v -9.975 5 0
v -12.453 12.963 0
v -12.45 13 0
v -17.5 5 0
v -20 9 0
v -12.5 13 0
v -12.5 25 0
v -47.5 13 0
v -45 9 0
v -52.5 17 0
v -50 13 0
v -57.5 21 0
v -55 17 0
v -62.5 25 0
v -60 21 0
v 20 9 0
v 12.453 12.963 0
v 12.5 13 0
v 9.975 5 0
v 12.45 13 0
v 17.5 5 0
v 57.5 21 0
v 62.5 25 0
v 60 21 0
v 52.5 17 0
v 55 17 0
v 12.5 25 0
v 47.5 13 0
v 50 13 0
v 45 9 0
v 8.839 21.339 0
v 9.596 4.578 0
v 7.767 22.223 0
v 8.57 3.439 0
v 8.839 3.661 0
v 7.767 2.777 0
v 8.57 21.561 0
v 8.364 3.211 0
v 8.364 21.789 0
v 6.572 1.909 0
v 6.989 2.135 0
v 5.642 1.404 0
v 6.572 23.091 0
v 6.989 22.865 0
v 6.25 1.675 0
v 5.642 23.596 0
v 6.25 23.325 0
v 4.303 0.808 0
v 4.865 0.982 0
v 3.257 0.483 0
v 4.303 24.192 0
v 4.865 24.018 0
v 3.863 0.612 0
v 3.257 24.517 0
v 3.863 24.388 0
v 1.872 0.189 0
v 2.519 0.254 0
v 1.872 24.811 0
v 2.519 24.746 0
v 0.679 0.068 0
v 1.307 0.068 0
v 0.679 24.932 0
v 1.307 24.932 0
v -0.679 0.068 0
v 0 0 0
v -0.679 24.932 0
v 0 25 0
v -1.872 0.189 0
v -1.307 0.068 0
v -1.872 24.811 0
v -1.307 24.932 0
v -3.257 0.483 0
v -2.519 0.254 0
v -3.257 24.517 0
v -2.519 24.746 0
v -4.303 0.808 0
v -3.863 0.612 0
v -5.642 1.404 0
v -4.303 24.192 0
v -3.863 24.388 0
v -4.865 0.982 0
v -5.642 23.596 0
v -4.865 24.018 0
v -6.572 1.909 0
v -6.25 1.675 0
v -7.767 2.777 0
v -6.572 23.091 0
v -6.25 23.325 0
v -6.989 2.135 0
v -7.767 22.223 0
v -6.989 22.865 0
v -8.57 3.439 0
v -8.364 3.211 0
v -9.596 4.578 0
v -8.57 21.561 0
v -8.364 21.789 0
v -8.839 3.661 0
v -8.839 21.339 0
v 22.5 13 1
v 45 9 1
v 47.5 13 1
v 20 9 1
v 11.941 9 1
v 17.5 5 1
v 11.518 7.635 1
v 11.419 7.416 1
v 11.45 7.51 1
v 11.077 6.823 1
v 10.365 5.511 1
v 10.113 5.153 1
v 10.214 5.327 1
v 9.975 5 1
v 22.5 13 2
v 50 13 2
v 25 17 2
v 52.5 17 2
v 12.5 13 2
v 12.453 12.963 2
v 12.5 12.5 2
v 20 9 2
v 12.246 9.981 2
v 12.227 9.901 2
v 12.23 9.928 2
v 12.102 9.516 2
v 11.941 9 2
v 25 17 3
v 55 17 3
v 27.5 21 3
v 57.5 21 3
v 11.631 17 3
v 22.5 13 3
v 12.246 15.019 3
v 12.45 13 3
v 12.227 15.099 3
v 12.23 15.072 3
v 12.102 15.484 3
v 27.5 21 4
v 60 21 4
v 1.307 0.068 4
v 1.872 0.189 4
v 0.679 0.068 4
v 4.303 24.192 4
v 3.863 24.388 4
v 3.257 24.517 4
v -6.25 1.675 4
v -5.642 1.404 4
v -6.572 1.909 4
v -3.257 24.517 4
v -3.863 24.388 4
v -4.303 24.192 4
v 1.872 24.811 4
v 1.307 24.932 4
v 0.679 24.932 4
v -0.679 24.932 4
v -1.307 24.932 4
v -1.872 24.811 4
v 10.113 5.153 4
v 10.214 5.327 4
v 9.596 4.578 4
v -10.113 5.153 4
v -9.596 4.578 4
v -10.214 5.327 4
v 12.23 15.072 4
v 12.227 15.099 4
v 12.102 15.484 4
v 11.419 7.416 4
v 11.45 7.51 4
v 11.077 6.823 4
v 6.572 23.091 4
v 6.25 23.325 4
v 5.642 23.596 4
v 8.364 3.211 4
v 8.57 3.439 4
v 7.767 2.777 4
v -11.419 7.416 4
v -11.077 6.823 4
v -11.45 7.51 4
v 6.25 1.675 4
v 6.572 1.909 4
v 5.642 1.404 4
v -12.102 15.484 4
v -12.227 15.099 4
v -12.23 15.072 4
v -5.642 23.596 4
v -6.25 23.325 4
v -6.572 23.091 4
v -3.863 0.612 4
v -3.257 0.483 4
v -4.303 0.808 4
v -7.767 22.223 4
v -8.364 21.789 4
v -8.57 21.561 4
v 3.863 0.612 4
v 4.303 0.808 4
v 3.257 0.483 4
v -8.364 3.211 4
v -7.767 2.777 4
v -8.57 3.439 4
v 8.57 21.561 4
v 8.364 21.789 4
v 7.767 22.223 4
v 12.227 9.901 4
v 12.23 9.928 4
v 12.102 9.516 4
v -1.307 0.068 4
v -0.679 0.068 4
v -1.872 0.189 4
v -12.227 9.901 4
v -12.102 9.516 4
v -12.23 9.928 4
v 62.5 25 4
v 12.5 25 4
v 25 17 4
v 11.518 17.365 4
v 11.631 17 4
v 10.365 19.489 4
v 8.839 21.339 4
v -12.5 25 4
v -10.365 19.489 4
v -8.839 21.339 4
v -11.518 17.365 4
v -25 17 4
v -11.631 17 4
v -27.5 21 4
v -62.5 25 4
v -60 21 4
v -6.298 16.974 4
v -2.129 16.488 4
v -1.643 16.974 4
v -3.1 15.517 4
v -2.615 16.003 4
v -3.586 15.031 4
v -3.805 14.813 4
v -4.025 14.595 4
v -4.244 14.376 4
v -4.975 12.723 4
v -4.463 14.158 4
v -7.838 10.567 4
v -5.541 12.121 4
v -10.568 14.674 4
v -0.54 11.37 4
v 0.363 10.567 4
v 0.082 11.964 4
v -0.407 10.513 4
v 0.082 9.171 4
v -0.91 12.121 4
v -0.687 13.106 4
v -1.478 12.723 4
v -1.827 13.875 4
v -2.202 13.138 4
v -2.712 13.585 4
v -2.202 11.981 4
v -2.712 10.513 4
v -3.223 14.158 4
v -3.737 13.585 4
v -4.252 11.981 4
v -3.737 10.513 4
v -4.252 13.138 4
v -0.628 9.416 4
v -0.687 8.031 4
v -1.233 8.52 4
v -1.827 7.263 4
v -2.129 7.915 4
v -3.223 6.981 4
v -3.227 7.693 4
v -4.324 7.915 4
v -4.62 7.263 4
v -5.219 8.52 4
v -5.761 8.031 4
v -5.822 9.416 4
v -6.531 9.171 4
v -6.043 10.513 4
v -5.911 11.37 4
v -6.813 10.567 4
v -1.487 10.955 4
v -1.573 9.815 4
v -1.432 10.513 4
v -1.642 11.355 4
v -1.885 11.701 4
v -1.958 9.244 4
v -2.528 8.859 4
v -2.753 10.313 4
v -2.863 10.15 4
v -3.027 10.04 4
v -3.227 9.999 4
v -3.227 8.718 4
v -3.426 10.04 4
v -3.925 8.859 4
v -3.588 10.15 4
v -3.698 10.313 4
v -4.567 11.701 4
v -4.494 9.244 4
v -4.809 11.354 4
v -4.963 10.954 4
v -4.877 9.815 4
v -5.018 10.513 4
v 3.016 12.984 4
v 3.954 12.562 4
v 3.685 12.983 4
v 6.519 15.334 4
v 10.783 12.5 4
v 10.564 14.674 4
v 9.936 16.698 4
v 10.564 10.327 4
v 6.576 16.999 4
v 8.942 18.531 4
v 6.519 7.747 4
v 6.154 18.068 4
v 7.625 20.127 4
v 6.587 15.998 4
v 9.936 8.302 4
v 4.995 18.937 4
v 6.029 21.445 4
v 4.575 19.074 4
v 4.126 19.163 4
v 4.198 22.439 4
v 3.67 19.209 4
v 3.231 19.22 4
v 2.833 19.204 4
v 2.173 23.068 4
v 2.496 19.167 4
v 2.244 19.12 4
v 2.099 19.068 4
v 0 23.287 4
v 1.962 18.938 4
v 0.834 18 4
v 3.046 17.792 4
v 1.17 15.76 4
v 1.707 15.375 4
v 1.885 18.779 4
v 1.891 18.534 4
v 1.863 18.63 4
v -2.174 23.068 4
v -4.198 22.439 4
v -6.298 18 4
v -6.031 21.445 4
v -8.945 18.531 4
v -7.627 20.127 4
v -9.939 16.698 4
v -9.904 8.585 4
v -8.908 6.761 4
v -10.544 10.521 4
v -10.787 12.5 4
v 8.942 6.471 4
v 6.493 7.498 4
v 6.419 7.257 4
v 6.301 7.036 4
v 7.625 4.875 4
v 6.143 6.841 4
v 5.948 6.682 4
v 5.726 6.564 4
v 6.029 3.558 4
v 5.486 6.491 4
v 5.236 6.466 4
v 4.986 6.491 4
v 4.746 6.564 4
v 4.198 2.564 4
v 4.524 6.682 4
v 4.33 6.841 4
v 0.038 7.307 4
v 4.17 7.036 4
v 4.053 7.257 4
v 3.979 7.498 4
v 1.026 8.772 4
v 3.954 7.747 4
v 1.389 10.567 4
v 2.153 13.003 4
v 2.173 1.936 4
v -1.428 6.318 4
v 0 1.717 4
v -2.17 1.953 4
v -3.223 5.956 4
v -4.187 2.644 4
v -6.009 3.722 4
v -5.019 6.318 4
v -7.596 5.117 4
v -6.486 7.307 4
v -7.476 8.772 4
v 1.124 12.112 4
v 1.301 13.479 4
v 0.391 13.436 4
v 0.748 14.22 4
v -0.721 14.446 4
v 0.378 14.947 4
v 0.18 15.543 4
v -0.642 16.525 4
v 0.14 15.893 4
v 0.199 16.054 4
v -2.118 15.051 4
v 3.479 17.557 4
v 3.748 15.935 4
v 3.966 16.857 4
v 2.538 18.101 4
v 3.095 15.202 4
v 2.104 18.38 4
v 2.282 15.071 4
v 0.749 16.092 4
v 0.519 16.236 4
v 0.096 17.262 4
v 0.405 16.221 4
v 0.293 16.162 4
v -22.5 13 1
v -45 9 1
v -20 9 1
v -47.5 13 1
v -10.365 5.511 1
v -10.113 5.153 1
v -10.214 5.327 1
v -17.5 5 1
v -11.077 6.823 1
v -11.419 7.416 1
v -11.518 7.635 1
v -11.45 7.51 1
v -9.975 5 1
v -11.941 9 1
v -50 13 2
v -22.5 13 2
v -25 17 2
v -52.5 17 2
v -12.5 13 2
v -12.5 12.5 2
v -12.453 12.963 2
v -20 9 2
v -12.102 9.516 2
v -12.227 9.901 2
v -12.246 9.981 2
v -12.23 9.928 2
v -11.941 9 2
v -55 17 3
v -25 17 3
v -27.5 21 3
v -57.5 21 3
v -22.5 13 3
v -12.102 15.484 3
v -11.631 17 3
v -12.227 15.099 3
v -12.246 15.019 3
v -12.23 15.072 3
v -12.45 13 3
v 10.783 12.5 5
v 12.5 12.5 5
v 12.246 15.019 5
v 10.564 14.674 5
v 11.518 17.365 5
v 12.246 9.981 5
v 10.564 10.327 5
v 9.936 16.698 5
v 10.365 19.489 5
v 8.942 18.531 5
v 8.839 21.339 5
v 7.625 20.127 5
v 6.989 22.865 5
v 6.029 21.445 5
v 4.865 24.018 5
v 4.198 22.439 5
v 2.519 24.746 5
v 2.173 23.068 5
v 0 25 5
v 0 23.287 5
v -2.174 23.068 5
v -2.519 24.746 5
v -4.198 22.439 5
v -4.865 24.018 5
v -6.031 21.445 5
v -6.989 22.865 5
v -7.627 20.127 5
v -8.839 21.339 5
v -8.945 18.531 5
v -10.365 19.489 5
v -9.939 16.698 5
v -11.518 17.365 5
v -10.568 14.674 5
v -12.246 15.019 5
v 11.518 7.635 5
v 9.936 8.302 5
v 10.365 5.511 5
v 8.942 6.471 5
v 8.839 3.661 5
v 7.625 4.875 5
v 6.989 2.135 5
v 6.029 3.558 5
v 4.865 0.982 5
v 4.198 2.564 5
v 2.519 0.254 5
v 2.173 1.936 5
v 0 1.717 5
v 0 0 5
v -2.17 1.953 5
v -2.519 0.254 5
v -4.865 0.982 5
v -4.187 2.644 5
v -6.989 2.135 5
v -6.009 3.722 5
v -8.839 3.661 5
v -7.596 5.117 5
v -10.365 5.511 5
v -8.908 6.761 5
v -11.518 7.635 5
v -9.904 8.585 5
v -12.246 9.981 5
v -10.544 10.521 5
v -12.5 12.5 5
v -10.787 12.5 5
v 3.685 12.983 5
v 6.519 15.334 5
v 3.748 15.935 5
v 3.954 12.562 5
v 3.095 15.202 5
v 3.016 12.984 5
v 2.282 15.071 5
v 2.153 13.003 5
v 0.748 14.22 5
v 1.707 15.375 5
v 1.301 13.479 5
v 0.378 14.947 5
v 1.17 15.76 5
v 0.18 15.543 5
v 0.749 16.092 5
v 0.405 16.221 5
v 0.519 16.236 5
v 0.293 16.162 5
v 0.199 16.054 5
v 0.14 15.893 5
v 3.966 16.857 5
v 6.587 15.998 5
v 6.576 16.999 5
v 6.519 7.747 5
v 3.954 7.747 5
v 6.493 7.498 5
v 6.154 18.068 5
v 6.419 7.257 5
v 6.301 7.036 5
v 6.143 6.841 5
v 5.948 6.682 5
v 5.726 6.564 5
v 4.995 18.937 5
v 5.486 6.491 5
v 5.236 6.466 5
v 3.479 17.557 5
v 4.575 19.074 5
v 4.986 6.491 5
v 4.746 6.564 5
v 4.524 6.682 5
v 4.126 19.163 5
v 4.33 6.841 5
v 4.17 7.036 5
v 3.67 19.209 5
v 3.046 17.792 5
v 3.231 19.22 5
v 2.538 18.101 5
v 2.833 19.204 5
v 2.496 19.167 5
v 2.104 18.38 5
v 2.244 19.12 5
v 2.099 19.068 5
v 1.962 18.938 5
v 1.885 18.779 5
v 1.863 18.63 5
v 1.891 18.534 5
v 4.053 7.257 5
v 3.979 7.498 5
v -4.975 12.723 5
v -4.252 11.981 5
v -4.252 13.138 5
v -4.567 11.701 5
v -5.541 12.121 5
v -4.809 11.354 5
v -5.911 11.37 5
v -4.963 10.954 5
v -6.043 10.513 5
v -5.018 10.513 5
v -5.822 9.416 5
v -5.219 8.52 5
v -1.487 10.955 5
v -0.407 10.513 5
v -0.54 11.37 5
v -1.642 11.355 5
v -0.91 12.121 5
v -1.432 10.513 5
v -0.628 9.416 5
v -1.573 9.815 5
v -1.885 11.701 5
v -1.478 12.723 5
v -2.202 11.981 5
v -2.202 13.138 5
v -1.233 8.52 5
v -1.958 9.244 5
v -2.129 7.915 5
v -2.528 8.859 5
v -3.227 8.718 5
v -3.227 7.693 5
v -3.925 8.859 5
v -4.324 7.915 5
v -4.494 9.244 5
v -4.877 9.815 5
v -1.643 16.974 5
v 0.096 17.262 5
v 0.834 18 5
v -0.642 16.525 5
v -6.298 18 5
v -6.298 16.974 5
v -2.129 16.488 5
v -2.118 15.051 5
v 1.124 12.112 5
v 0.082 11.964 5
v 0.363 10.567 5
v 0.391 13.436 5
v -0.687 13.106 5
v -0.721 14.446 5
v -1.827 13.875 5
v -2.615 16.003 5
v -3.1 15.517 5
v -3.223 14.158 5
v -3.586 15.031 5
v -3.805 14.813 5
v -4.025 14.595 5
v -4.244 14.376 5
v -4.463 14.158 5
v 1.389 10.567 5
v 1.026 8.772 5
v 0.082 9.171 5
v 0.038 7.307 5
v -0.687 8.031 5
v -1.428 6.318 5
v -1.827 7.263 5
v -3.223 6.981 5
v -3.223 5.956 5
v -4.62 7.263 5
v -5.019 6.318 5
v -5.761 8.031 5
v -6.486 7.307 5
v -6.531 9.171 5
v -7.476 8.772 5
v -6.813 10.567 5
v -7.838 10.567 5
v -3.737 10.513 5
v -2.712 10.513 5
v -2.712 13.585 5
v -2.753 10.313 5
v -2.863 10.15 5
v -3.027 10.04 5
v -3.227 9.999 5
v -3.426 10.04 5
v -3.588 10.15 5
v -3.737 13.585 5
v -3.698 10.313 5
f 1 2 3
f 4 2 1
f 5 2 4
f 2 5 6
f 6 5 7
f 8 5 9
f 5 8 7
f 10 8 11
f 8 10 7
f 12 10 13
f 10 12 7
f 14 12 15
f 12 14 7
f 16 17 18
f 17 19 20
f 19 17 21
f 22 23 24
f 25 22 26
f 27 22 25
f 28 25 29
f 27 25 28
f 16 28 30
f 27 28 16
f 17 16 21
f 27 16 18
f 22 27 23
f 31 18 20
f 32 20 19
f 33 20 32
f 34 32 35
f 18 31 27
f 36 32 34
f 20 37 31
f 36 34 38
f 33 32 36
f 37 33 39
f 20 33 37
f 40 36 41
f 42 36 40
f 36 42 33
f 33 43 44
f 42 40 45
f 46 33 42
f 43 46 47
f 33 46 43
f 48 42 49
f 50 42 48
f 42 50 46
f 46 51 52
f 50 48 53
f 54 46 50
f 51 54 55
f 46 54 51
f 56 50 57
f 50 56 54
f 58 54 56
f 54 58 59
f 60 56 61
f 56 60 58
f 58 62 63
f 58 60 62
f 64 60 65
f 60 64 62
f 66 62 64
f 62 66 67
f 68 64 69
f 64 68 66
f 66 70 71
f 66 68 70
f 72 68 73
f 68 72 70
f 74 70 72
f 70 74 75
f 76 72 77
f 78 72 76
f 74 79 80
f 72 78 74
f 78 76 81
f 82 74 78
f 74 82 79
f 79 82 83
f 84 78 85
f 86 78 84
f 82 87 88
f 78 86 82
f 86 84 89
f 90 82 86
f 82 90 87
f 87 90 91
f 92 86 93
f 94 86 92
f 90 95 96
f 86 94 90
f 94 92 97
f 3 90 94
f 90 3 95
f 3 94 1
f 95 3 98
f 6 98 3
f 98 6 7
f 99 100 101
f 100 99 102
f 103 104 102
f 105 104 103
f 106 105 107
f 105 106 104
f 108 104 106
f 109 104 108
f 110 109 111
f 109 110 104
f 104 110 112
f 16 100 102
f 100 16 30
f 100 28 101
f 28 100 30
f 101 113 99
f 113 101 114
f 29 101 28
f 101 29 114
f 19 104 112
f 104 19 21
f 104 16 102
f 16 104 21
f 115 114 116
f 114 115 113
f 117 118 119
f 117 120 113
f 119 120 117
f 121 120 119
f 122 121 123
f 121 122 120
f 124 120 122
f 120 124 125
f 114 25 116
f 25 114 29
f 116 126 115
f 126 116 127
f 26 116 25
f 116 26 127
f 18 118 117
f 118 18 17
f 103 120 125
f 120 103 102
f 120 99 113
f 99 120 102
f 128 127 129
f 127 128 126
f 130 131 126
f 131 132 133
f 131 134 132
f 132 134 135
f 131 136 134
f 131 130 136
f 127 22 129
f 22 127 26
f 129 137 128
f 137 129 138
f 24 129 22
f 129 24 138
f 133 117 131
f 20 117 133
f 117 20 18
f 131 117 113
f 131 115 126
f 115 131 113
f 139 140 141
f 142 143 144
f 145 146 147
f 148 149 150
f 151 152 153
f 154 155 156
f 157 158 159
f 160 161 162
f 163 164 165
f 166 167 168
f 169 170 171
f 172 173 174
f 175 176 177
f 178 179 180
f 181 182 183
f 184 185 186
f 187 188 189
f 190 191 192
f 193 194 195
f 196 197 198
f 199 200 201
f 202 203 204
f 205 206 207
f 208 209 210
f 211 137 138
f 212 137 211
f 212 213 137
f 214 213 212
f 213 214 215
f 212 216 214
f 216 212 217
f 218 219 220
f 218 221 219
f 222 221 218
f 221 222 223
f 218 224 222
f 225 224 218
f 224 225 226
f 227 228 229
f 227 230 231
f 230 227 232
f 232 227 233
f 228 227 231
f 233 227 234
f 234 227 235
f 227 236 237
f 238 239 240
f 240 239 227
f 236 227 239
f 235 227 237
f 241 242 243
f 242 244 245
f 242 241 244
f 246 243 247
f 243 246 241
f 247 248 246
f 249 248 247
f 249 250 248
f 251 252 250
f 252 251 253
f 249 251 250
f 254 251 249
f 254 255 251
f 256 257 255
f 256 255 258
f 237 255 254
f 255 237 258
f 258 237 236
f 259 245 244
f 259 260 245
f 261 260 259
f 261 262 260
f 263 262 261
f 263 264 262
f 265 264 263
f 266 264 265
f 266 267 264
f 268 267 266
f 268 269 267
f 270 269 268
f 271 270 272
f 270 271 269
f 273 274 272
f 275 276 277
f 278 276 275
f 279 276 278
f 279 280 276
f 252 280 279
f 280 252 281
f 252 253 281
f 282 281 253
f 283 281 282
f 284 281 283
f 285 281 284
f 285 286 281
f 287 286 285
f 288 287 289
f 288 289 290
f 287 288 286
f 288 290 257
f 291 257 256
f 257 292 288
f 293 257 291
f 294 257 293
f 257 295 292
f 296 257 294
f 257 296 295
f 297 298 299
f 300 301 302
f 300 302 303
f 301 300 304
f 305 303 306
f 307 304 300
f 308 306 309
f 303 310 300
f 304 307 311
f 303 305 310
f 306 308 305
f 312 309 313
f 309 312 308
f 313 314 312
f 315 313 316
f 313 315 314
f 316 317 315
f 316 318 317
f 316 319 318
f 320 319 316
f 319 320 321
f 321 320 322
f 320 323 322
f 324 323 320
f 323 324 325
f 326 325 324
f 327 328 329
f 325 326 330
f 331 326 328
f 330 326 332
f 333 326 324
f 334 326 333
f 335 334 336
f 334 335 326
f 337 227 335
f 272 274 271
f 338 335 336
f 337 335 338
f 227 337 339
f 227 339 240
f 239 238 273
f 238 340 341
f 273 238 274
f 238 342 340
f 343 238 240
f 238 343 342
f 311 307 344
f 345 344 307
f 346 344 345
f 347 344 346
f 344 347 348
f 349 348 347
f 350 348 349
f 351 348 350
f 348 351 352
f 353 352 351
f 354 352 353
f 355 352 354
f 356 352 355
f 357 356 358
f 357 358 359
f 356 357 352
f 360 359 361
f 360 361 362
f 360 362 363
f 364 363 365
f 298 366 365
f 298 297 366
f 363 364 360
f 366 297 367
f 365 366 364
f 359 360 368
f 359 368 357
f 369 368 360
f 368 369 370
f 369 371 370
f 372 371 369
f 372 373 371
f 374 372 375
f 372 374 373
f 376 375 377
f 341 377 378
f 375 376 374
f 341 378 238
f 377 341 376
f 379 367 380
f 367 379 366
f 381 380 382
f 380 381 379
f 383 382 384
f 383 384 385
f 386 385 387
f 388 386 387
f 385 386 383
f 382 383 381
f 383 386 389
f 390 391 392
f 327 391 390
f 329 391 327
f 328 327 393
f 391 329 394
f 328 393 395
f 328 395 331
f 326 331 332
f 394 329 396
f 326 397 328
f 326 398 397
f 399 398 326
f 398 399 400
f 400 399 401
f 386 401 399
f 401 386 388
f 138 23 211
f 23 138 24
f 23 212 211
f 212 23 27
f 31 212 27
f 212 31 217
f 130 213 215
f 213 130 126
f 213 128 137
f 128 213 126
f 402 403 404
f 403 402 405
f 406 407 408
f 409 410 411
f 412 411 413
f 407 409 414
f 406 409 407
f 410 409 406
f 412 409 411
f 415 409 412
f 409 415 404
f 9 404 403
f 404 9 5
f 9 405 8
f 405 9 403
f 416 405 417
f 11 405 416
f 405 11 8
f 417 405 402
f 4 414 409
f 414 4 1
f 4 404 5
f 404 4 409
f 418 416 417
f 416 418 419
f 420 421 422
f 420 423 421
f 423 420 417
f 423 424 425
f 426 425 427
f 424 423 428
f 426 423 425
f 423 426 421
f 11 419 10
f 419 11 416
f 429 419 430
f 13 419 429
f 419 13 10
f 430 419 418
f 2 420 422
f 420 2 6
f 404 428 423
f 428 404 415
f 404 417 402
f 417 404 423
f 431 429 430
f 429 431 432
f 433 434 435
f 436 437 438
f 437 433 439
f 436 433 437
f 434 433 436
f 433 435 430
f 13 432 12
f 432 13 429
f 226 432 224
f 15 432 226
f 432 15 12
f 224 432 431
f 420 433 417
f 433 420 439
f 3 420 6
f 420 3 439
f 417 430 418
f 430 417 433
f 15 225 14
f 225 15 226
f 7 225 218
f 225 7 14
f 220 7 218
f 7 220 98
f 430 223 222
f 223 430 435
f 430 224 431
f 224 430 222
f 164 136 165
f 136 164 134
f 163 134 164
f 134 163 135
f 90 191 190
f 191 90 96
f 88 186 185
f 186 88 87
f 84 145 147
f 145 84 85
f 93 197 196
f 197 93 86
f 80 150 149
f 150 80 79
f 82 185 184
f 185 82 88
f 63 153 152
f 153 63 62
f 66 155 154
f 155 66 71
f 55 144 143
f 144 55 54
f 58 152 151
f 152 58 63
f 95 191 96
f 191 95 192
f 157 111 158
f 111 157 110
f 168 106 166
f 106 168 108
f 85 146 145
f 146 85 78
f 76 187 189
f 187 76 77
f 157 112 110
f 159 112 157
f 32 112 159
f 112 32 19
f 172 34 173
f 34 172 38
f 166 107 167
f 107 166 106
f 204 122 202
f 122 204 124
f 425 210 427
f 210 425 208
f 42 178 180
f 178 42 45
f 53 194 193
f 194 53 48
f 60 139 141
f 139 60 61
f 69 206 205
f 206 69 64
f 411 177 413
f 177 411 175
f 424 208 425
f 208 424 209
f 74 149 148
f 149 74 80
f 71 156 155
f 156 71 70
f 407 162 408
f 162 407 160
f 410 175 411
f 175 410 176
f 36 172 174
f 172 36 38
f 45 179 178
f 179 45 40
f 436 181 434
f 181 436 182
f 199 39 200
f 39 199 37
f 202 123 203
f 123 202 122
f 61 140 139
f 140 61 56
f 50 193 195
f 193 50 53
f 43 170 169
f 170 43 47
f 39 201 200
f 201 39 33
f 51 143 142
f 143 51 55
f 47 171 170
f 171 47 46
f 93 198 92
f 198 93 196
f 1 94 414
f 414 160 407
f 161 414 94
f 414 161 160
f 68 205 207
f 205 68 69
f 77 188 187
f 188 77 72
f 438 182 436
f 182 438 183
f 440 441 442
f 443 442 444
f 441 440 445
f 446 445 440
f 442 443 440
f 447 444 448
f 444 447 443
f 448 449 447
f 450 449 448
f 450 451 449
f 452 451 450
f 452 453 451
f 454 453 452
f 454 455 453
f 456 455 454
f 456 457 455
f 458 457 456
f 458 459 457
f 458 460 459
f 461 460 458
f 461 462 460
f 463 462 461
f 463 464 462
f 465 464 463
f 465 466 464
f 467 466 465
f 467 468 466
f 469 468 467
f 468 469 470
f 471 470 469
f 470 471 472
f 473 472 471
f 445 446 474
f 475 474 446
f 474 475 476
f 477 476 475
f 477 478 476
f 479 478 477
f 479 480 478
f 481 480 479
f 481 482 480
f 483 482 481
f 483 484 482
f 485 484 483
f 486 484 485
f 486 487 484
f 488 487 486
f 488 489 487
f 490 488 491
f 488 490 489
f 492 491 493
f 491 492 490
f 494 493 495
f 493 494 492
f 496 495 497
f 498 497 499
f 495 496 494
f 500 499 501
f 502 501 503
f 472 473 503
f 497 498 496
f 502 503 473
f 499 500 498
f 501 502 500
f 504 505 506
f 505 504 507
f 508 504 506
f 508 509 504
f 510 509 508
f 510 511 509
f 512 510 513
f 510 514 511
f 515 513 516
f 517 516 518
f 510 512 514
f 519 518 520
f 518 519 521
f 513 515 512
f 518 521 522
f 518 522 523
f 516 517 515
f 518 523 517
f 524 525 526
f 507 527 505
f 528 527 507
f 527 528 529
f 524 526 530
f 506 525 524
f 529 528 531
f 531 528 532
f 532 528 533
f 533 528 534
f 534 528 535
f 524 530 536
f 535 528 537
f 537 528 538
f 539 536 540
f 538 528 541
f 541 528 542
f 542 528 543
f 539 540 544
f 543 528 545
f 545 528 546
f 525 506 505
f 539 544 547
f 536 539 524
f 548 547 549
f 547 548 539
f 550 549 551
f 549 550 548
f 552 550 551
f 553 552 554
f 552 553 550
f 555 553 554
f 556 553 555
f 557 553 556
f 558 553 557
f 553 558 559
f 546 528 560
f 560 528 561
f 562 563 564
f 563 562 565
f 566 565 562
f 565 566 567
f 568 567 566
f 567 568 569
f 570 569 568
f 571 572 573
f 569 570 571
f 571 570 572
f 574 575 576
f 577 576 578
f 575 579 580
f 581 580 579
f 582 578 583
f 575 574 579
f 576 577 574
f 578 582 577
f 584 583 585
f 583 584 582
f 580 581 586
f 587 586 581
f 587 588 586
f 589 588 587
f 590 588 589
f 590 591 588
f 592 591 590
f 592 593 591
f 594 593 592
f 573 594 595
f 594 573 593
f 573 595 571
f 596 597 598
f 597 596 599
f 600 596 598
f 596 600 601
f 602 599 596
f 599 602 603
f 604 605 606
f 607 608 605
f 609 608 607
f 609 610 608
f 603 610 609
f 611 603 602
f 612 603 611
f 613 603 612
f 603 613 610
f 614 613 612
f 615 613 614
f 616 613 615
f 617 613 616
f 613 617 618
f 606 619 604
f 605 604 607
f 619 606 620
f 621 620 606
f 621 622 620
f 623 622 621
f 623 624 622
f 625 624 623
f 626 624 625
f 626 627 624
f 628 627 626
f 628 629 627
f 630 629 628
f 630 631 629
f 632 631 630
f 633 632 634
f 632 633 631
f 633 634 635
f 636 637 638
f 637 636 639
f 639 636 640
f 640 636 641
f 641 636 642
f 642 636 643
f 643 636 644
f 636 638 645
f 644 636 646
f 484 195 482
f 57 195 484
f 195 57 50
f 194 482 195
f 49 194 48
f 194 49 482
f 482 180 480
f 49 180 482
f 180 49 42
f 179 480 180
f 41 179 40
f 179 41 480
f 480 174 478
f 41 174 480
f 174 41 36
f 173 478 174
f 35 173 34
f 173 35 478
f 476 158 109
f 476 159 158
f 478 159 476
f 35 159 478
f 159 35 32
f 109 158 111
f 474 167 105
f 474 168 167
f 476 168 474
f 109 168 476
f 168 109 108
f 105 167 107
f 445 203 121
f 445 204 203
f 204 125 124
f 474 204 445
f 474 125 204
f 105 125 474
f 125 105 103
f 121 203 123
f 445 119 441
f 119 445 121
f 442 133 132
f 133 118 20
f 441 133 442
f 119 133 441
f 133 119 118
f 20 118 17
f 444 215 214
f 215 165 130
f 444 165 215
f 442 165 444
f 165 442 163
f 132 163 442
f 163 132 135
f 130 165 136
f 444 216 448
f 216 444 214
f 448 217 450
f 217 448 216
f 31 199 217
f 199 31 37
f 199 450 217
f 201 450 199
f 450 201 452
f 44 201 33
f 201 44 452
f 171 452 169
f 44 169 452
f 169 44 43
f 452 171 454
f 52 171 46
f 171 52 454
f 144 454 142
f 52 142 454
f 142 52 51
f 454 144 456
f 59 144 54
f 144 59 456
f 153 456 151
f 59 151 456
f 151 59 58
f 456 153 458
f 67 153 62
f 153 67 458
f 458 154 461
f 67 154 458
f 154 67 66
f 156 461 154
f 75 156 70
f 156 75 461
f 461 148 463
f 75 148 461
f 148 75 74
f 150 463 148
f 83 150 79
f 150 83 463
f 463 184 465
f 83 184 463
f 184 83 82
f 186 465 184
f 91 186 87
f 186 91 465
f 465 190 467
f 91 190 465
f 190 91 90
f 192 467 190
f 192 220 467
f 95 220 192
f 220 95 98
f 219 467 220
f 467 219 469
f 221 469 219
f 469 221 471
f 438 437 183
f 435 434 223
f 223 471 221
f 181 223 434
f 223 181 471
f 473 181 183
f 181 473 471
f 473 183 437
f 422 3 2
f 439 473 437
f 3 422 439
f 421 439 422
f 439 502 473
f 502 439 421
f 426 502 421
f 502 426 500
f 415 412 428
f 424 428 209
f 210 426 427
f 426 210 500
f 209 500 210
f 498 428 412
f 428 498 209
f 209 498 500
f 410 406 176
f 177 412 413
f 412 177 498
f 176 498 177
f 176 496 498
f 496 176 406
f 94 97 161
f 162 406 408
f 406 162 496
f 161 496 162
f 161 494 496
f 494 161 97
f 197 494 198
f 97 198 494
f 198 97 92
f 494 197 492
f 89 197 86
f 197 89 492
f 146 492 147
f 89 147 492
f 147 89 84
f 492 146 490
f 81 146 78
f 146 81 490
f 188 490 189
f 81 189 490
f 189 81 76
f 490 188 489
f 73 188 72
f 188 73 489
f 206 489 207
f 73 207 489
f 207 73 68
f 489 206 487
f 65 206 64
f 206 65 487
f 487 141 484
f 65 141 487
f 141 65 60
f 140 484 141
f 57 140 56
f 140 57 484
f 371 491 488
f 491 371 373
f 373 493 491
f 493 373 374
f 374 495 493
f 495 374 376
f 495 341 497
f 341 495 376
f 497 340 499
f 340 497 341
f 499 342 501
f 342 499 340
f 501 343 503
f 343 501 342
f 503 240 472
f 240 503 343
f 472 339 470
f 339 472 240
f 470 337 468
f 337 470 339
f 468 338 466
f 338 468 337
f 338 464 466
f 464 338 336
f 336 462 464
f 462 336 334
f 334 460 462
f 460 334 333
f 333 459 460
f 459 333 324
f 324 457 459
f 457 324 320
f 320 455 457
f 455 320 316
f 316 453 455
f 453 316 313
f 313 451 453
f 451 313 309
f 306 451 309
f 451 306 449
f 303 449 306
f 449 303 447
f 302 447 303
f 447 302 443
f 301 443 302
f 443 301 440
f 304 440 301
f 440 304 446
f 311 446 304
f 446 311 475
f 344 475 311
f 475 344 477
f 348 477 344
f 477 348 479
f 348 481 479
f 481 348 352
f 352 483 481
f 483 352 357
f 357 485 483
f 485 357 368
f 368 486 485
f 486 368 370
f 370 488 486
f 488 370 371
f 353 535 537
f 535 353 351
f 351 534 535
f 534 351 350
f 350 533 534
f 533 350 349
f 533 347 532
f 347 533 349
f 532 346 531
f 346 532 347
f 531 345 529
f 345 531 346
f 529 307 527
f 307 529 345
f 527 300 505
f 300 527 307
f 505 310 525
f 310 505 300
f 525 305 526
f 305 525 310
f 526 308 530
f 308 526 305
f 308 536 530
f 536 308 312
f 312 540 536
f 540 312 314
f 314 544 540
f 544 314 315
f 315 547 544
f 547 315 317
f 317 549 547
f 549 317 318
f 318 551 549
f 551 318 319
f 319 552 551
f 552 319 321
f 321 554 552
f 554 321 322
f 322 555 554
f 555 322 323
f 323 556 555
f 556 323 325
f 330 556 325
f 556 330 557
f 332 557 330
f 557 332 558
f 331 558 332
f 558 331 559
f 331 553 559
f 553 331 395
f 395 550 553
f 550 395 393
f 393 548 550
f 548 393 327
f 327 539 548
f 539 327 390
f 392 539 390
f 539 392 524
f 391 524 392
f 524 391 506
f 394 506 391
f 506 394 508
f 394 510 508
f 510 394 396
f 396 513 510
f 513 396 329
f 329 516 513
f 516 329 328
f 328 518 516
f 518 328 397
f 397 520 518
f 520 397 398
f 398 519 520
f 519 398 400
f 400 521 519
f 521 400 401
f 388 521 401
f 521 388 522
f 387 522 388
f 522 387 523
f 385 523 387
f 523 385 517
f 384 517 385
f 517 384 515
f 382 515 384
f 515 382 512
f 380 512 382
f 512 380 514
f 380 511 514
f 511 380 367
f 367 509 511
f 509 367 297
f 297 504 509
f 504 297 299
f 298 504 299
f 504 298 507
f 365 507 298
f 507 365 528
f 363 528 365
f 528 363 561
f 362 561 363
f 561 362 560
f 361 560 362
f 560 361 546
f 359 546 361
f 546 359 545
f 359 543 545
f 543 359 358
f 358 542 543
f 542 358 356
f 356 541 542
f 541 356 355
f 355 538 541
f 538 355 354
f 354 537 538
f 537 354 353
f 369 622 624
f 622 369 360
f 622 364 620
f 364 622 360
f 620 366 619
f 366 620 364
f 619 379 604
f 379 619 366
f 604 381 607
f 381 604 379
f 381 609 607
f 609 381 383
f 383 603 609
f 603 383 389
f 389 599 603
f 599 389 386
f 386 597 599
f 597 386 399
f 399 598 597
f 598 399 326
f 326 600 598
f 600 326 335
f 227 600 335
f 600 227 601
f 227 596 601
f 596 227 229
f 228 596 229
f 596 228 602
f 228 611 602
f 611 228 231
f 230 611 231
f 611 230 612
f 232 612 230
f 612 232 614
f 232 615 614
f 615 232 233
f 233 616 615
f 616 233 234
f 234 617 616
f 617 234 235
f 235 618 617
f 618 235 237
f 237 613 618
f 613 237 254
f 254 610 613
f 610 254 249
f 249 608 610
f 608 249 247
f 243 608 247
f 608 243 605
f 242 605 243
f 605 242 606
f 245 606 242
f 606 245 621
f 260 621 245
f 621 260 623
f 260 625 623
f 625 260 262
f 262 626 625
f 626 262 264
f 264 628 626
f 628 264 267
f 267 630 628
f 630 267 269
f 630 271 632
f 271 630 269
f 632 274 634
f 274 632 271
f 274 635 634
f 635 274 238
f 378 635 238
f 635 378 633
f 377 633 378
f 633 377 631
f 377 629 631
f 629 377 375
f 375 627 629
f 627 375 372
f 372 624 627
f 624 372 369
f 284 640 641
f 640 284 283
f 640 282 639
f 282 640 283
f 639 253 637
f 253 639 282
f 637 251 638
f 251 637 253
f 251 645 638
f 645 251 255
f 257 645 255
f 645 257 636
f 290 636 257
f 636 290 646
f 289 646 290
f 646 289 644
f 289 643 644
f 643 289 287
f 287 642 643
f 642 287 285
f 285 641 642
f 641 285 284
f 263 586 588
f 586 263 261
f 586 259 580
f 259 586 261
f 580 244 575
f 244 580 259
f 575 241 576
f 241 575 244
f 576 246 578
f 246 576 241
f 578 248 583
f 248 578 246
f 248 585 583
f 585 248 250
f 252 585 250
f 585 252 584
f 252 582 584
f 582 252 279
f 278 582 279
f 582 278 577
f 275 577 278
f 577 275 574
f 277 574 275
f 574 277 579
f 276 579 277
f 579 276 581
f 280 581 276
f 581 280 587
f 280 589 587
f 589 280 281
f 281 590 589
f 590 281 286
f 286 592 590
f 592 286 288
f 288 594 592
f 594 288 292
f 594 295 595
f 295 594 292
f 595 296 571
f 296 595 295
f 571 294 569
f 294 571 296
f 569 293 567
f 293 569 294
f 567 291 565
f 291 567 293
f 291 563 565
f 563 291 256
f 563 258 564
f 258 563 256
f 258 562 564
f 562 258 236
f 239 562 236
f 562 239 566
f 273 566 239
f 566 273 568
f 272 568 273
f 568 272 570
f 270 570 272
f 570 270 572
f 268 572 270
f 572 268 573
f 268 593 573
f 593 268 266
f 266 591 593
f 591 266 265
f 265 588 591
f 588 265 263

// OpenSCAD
/*
Pilot Wing Badge for the (RC) Flight Team at the Netz39 Hackerspace in Magdeburg, Germany

You may customize it using your own logo; provide it as a 50mm x 50mm .dxf file.
*/

module wings(){
	linear_extrude(height = 2, center = false, convexity = 10, twist = 0)
	polygon([[10,10],[35,10],[40,18],[90,18],[95,26],[45,26],[20,18]]);
	linear_extrude(height = 4, center = false, convexity = 10, twist = 0)
	polygon([[15,18],[40,18],[45,26],[100,26],[105,34],[50,34],[25,26]]);
	linear_extrude(height = 6, center = false, convexity = 10, twist = 0)
	polygon([[20,26],[45,26],[50,34],[110,34],[115,42],[55,42],[20,34]]);
	linear_extrude(height = 8, center = false, convexity = 10, twist = 0)
	polygon([[20,34],[50,34],[55,42],[120,42],[125,50],[25,50],[17,42]]);
}

module badge(logo) {
	wings();
	mirror() wings();
	translate([0,25,0])
	cylinder(h=8,r=25);
	linear_extrude(height = 10, center = false, convexity = 10, twist = 0)
	translate([-25,0,0])
	import(logo);
}

scale(0.5)badge(logo="n39_logo_50mm.dxf");
